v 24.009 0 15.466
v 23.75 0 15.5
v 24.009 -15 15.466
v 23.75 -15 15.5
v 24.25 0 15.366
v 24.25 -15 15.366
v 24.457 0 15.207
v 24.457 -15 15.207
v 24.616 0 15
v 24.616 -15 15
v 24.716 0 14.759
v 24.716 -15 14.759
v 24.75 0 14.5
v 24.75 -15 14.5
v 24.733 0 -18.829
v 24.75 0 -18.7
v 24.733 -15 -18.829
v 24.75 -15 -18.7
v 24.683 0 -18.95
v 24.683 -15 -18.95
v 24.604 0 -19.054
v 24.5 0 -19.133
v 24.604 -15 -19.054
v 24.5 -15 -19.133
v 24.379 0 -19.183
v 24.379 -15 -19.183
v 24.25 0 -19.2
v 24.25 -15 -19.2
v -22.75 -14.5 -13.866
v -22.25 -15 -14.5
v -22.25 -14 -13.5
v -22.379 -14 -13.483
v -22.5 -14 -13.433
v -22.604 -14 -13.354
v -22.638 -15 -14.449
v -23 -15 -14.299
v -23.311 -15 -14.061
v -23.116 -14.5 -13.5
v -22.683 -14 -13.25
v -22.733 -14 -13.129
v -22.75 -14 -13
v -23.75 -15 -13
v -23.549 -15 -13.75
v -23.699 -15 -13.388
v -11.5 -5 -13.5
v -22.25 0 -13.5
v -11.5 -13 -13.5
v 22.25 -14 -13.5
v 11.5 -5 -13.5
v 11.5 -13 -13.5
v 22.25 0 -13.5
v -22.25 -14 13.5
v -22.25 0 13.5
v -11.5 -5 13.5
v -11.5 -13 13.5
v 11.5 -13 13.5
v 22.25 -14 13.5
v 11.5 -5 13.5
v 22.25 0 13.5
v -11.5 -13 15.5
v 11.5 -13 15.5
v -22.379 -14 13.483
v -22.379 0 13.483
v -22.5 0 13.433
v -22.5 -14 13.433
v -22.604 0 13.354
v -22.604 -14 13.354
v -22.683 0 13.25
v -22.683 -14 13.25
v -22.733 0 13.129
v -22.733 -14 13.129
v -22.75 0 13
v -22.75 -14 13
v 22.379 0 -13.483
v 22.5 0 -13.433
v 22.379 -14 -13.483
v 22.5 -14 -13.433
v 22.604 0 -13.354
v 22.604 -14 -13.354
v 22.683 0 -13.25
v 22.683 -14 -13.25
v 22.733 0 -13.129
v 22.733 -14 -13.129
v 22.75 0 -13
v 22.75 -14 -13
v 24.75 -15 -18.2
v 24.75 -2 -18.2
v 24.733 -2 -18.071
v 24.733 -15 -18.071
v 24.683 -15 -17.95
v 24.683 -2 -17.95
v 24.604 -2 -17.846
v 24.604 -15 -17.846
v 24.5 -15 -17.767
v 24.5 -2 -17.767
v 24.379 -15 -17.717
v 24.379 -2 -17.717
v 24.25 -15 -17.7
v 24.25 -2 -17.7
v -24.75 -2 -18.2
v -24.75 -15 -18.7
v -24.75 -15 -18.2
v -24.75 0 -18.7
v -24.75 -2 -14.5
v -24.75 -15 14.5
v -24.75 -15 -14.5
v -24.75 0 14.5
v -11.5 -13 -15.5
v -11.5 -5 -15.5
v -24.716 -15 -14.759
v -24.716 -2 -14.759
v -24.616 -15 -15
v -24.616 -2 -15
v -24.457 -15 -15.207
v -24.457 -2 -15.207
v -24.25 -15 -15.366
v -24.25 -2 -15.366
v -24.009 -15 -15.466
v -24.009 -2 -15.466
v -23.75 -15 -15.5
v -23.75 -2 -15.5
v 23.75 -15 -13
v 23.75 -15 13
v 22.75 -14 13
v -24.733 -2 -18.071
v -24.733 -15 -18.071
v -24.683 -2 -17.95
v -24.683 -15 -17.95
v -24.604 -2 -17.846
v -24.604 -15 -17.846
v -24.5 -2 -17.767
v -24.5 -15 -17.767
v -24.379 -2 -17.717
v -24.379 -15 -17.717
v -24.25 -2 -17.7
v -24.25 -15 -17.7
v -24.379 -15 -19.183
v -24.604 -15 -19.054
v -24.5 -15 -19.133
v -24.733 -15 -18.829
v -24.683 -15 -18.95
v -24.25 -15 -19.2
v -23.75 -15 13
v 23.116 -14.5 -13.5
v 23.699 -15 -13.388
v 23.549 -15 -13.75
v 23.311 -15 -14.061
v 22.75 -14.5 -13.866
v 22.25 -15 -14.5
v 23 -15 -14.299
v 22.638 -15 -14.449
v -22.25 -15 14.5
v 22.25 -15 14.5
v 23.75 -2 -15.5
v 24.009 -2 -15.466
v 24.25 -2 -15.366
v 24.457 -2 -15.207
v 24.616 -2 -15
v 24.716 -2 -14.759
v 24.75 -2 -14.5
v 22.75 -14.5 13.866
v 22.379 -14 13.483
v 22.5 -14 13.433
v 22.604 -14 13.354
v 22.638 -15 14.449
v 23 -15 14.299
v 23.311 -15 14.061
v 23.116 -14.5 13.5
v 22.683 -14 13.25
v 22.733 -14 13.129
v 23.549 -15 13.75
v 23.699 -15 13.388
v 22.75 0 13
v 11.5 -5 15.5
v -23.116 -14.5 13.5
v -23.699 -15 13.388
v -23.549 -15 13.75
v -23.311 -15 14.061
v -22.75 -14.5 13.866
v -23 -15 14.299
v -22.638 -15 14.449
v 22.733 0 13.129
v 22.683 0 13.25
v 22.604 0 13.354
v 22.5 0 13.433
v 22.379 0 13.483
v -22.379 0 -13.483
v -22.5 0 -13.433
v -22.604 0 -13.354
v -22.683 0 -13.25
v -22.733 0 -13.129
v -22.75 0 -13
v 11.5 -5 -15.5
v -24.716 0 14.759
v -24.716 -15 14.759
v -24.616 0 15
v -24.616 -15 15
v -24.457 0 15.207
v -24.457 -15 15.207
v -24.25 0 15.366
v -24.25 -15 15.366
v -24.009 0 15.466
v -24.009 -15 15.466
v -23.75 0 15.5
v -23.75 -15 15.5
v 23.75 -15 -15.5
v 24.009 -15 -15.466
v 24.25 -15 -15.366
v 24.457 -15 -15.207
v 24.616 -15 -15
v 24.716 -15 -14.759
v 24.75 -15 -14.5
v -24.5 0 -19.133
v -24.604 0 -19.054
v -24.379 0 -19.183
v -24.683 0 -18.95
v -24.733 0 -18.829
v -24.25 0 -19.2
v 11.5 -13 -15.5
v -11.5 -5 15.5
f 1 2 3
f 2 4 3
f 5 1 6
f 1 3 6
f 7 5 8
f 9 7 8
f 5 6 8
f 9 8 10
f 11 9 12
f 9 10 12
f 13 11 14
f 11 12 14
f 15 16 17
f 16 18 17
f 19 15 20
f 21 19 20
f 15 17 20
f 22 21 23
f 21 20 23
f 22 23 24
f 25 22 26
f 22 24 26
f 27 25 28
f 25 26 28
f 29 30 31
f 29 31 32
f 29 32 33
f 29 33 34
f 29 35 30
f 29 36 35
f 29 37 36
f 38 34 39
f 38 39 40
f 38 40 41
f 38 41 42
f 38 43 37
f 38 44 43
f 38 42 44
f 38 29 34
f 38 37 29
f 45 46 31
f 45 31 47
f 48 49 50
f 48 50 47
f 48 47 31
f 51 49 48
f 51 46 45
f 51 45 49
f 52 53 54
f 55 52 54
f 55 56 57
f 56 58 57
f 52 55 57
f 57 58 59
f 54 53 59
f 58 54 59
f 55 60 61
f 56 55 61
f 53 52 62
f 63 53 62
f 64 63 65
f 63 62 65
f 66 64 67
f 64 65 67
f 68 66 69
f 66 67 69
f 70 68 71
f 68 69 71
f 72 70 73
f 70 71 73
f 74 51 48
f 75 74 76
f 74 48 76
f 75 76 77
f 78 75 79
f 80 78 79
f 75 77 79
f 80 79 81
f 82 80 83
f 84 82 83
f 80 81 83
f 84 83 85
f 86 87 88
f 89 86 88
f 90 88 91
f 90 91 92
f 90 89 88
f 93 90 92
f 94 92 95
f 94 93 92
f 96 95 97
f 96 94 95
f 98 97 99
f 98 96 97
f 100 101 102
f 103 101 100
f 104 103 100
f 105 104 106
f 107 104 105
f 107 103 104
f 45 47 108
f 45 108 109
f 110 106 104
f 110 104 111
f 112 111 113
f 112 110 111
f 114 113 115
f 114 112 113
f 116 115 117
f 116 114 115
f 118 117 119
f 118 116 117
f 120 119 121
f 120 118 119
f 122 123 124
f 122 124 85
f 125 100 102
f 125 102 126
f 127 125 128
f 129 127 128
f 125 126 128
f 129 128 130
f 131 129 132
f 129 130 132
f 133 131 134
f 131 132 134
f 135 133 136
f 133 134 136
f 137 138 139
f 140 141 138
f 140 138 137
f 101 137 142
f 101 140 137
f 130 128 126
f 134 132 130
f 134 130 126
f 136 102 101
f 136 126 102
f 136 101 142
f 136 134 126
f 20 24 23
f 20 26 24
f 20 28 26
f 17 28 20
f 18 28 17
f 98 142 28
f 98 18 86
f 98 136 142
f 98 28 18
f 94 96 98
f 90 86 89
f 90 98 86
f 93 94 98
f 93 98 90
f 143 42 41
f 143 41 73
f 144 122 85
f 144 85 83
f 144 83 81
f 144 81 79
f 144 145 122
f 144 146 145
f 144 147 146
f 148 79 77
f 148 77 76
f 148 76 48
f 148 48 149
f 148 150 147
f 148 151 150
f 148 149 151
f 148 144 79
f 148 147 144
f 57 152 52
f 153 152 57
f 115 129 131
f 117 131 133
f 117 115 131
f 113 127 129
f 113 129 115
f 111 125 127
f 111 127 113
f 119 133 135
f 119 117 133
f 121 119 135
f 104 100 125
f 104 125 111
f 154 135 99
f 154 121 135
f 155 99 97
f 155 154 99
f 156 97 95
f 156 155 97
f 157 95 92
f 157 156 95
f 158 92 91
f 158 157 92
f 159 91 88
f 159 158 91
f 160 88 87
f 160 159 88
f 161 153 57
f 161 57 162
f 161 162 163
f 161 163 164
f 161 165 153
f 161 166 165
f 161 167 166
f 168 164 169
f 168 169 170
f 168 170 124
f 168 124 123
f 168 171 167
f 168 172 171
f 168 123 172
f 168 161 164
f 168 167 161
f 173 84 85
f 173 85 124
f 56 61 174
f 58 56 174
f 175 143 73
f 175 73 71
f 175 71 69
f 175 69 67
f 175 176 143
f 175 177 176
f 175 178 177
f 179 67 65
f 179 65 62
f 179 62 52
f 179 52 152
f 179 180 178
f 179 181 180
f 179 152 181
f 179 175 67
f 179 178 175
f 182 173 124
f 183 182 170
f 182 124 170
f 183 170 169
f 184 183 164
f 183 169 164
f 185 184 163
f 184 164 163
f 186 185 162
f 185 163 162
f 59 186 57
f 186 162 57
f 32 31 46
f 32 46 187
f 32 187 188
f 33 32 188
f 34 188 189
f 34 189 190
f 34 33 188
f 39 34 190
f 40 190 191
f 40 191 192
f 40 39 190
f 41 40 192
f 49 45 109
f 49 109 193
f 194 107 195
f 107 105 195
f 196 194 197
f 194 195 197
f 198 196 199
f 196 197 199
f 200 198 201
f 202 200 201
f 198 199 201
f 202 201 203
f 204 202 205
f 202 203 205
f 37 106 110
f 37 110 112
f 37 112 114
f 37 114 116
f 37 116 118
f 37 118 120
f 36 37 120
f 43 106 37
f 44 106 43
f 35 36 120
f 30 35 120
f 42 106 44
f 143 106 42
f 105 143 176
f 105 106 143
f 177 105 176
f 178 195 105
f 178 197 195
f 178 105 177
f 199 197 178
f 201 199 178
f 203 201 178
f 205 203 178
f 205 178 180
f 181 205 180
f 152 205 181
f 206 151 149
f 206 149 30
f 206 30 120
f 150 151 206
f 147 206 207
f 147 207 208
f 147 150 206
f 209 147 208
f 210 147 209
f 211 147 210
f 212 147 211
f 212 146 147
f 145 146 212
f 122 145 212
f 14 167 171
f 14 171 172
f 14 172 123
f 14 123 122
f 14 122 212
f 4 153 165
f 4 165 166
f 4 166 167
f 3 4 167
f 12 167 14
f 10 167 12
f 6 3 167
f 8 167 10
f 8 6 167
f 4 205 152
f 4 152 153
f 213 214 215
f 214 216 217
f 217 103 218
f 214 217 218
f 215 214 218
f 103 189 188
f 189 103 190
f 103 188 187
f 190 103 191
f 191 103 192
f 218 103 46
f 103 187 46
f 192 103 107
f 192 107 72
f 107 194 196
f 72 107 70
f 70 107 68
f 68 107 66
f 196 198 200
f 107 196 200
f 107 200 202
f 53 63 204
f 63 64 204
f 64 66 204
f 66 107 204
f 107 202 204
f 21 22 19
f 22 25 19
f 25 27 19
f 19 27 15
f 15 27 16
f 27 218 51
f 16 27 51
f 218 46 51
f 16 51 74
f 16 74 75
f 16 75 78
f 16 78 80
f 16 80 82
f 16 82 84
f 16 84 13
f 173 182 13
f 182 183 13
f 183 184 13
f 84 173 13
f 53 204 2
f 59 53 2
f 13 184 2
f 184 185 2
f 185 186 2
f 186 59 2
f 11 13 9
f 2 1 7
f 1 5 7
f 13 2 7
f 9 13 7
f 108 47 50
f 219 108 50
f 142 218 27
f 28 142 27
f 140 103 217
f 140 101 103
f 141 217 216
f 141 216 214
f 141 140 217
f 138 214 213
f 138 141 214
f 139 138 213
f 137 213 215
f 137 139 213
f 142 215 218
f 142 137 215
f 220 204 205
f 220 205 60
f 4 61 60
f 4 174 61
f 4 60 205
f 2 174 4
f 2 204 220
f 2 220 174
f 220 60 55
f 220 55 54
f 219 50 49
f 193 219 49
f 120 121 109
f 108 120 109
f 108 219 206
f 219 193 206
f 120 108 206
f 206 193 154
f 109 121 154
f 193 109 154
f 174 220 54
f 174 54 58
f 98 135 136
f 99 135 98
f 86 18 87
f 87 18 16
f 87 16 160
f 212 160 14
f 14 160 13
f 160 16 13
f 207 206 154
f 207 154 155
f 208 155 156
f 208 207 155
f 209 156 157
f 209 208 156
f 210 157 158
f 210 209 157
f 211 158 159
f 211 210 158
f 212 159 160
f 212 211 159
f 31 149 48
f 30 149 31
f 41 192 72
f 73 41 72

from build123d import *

# Parameters (mm, degrees)
F0_W     = 49.5
F0_H     = 31
F0_W_2   = 45.5
F0_H_2   = 27
F1_DEPTH = 15
F2_W     = 23
F2_H     = 8
F3_DEPTH = 31.001
F4_R     = 1
F5_R     = 0.5
F6_W     = 49.5
F6_H     = 1.5
F7_DEPTH = 15
F8_W     = 49.5
F8_H     = 5.7
F9_DEPTH = 2
F10_R    = 0.5
F11_SIZE = 1


with BuildPart() as f1:
    # F0 (on Front) → F1 (new body)
    with BuildSketch(Plane.XZ):
        Rectangle(F0_W, F0_H)
        Rectangle(F0_W_2, F0_H_2, mode=Mode.SUBTRACT)
    extrude(amount=F1_DEPTH)

    # F2 (on face) → F3 (cut, through all)
    with BuildSketch(Plane.XY.offset(15.5)):
        with Locations((0, -9)):
            Rectangle(F2_W, F2_H)
    extrude(amount=-F3_DEPTH, mode=Mode.SUBTRACT)

    # F4
    f4_edges = [f1.edges().sort_by_distance(p)[0] for p in [
        (24.75, -7.5, 15.5),
        (24.75, -7.5, -15.5),
        (-24.75, -7.5, 15.5),
        (-24.75, -7.5, -15.5),
    ]]
    fillet(f4_edges, radius=F4_R)

    # F5
    f5_edges = [f1.edges().sort_by_distance(p)[0] for p in [
        (-22.75, -7.5, 13.5),
        (22.75, -7.5, 13.5),
        (22.75, -7.5, -13.5),
        (-22.75, -7.5, -13.5),
    ]]
    fillet(f5_edges, radius=F5_R)



with BuildPart() as f7:
    # F6 (on Front) → F7 (new body, through all)
    with BuildSketch(Plane.XZ):
        with Locations((0, -18.45)):
            Rectangle(F6_W, F6_H)
    extrude(amount=F7_DEPTH)


with BuildPart() as f1_1:
    add(f1.part)

    add(f7.part)  # F9 merges F7
    # F8 (on Front) → F9 (join)
    with BuildSketch(Plane.XZ):
        with Locations((0, -16.35)):
            Rectangle(F8_W, F8_H)
    extrude(amount=F9_DEPTH)

    # F10
    f10_edges = [f1_1.edges().sort_by_distance(p)[0] for p in [
        (24.75, -7.5, -19.2),
        (24.75, -8.5, -17.7),
        (-24.75, -7.5, -19.2),
        (-24.75, -8.5, -17.7),
    ]]
    fillet(f10_edges, radius=F10_R)

    # F11
    f11_edges = [f1_1.edges().sort_by_distance(p)[0] for p in [
        (0, -15, 13.5),
    ]]
    chamfer(f11_edges, length=F11_SIZE)


solid = f1_1.part
